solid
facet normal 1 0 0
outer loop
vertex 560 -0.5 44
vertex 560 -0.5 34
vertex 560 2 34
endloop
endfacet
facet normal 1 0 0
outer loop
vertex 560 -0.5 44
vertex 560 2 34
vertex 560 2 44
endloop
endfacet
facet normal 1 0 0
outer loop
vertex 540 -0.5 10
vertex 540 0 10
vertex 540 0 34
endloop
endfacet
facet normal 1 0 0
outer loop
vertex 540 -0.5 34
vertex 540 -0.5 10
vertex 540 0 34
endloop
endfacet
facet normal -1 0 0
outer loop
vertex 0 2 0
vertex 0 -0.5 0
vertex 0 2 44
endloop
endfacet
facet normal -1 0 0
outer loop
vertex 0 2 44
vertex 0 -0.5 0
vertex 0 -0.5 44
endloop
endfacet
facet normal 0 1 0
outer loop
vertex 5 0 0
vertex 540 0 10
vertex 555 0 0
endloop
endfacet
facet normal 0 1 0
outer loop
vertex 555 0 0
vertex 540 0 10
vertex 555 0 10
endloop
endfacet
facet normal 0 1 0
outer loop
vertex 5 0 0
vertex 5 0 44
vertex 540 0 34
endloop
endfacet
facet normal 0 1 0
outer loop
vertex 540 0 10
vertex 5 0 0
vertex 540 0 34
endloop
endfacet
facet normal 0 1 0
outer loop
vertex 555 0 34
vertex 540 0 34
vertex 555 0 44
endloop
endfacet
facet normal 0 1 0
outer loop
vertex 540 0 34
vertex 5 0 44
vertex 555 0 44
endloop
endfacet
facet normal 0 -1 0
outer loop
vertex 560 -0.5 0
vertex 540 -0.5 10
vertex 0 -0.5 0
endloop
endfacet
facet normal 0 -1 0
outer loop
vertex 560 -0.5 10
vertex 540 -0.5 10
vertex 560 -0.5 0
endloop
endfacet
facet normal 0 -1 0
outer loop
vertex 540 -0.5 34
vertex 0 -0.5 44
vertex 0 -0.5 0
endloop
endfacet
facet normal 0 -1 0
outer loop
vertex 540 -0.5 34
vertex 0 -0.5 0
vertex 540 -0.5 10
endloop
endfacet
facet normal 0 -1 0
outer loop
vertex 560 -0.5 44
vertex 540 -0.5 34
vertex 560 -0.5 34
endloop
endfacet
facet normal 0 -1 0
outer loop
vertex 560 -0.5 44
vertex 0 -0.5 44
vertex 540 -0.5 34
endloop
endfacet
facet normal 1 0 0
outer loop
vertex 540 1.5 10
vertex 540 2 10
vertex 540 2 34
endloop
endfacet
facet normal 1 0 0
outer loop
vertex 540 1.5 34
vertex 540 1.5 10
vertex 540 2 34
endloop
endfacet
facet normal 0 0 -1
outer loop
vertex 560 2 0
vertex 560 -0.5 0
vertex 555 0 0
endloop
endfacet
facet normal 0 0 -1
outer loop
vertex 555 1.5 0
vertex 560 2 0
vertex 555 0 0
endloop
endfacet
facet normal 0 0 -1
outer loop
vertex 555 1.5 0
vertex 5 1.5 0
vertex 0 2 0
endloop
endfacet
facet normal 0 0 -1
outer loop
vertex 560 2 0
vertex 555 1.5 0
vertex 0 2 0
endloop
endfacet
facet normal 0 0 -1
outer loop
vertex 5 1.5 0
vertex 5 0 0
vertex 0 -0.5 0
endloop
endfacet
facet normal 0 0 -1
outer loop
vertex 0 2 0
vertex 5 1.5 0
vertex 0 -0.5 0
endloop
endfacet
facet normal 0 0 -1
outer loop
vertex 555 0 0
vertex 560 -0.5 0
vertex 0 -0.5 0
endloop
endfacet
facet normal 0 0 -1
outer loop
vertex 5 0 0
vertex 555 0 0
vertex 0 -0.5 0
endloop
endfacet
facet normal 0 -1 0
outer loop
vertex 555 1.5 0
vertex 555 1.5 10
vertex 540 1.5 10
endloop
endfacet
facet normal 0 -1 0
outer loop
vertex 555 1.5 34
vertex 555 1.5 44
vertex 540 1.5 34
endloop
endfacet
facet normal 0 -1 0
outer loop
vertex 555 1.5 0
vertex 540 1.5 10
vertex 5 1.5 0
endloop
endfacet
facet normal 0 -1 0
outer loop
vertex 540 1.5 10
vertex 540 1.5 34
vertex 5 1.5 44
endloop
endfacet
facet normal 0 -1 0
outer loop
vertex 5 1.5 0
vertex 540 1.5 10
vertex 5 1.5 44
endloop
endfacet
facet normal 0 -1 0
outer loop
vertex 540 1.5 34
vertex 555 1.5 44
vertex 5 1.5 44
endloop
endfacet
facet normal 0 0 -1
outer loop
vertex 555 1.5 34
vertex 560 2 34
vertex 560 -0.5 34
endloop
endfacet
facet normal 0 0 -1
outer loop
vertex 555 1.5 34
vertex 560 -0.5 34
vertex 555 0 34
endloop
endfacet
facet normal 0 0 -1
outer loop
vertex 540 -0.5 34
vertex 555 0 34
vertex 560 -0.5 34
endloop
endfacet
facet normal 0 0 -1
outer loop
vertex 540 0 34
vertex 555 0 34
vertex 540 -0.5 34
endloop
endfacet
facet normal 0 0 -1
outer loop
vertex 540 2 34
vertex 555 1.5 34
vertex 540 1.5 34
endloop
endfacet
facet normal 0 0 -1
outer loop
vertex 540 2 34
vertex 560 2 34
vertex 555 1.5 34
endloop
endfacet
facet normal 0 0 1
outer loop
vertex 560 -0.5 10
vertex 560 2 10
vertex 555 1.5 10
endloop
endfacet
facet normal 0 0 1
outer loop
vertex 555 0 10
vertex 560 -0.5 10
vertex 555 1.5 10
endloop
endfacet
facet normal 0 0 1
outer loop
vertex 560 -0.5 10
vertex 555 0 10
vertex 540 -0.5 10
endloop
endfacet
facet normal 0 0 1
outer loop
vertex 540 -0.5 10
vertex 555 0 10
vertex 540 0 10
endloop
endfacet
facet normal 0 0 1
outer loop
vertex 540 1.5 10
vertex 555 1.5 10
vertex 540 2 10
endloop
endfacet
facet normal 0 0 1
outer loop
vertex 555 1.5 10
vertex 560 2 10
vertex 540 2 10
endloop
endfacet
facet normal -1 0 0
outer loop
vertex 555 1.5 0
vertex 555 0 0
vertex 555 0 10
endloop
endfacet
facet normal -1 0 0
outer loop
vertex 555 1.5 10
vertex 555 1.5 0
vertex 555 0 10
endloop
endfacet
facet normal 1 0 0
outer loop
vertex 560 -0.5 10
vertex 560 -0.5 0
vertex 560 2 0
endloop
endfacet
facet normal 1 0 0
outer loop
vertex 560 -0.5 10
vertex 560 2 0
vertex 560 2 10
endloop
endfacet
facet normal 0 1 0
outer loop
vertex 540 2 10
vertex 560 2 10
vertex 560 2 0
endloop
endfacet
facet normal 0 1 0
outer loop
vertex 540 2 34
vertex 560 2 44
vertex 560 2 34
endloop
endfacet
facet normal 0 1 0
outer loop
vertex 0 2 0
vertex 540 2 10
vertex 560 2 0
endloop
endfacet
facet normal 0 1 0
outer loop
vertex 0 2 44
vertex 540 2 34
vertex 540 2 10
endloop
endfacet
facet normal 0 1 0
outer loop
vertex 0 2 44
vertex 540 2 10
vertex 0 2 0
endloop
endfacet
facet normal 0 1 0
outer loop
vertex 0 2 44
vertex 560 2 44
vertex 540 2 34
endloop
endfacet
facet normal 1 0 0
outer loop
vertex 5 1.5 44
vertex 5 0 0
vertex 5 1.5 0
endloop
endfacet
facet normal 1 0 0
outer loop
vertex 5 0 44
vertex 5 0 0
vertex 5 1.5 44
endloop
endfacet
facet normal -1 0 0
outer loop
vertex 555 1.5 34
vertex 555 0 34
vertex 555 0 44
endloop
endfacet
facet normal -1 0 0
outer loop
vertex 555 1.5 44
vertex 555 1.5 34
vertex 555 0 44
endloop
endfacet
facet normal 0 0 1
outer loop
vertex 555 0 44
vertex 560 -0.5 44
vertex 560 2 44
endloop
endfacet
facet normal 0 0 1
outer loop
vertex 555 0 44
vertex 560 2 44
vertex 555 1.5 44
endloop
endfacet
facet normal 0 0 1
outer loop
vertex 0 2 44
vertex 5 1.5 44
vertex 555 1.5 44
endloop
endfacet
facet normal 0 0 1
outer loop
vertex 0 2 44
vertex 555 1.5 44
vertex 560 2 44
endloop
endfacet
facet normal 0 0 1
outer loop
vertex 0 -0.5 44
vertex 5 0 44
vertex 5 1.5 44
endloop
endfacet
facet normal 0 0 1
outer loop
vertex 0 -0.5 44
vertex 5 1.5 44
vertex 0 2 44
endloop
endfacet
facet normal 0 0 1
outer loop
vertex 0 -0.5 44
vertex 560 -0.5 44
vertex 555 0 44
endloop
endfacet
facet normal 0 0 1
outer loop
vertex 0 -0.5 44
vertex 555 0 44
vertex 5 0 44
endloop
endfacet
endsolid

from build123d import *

# Parameters (mm, degrees)
F0_W     = 560
F0_H     = 44
F1_DEPTH = 0.5
F2_W     = 5
F2_H     = 44
F3_DEPTH = 1.5
F4_W     = 560
F4_H     = 44
F5_DEPTH = 0.5
F6_W     = 20
F6_H     = 24
F7_DEPTH = 2.501


with BuildPart() as f1:
    # F0 (on Front) → F1 (new body)
    with BuildSketch(Plane.XZ):
        with Locations((280, 22)):
            Rectangle(F0_W, F0_H)
    extrude(amount=F1_DEPTH)

    # F2 (on face) → F3 (join)
    with BuildSketch(Plane(origin=(0, 0, 0), x_dir=(-1, 0, 0), z_dir=(0, 1, 0))):
        with Locations((-557.5, 22)):
            Rectangle(F2_W, F2_H)
        with Locations((-2.5, 22)):
            Rectangle(F2_W, F2_H)
    extrude(amount=F3_DEPTH)

    # F4 (on face) → F5 (join)
    with BuildSketch(Plane(origin=(0, 1.5, 0), x_dir=(-1, 0, 0), z_dir=(0, 1, 0))):
        with Locations((-280, 22)):
            Rectangle(F4_W, F4_H)
    extrude(amount=F5_DEPTH)

    # F6 (on face) → F7 (cut, through all)
    with BuildSketch(Plane(origin=(0, 2, 0), x_dir=(-1, 0, 0), z_dir=(0, 1, 0))):
        with Locations((-550, 22)):
            Rectangle(F6_W, F6_H)
    extrude(amount=-F7_DEPTH, mode=Mode.SUBTRACT)


solid = f1.part
